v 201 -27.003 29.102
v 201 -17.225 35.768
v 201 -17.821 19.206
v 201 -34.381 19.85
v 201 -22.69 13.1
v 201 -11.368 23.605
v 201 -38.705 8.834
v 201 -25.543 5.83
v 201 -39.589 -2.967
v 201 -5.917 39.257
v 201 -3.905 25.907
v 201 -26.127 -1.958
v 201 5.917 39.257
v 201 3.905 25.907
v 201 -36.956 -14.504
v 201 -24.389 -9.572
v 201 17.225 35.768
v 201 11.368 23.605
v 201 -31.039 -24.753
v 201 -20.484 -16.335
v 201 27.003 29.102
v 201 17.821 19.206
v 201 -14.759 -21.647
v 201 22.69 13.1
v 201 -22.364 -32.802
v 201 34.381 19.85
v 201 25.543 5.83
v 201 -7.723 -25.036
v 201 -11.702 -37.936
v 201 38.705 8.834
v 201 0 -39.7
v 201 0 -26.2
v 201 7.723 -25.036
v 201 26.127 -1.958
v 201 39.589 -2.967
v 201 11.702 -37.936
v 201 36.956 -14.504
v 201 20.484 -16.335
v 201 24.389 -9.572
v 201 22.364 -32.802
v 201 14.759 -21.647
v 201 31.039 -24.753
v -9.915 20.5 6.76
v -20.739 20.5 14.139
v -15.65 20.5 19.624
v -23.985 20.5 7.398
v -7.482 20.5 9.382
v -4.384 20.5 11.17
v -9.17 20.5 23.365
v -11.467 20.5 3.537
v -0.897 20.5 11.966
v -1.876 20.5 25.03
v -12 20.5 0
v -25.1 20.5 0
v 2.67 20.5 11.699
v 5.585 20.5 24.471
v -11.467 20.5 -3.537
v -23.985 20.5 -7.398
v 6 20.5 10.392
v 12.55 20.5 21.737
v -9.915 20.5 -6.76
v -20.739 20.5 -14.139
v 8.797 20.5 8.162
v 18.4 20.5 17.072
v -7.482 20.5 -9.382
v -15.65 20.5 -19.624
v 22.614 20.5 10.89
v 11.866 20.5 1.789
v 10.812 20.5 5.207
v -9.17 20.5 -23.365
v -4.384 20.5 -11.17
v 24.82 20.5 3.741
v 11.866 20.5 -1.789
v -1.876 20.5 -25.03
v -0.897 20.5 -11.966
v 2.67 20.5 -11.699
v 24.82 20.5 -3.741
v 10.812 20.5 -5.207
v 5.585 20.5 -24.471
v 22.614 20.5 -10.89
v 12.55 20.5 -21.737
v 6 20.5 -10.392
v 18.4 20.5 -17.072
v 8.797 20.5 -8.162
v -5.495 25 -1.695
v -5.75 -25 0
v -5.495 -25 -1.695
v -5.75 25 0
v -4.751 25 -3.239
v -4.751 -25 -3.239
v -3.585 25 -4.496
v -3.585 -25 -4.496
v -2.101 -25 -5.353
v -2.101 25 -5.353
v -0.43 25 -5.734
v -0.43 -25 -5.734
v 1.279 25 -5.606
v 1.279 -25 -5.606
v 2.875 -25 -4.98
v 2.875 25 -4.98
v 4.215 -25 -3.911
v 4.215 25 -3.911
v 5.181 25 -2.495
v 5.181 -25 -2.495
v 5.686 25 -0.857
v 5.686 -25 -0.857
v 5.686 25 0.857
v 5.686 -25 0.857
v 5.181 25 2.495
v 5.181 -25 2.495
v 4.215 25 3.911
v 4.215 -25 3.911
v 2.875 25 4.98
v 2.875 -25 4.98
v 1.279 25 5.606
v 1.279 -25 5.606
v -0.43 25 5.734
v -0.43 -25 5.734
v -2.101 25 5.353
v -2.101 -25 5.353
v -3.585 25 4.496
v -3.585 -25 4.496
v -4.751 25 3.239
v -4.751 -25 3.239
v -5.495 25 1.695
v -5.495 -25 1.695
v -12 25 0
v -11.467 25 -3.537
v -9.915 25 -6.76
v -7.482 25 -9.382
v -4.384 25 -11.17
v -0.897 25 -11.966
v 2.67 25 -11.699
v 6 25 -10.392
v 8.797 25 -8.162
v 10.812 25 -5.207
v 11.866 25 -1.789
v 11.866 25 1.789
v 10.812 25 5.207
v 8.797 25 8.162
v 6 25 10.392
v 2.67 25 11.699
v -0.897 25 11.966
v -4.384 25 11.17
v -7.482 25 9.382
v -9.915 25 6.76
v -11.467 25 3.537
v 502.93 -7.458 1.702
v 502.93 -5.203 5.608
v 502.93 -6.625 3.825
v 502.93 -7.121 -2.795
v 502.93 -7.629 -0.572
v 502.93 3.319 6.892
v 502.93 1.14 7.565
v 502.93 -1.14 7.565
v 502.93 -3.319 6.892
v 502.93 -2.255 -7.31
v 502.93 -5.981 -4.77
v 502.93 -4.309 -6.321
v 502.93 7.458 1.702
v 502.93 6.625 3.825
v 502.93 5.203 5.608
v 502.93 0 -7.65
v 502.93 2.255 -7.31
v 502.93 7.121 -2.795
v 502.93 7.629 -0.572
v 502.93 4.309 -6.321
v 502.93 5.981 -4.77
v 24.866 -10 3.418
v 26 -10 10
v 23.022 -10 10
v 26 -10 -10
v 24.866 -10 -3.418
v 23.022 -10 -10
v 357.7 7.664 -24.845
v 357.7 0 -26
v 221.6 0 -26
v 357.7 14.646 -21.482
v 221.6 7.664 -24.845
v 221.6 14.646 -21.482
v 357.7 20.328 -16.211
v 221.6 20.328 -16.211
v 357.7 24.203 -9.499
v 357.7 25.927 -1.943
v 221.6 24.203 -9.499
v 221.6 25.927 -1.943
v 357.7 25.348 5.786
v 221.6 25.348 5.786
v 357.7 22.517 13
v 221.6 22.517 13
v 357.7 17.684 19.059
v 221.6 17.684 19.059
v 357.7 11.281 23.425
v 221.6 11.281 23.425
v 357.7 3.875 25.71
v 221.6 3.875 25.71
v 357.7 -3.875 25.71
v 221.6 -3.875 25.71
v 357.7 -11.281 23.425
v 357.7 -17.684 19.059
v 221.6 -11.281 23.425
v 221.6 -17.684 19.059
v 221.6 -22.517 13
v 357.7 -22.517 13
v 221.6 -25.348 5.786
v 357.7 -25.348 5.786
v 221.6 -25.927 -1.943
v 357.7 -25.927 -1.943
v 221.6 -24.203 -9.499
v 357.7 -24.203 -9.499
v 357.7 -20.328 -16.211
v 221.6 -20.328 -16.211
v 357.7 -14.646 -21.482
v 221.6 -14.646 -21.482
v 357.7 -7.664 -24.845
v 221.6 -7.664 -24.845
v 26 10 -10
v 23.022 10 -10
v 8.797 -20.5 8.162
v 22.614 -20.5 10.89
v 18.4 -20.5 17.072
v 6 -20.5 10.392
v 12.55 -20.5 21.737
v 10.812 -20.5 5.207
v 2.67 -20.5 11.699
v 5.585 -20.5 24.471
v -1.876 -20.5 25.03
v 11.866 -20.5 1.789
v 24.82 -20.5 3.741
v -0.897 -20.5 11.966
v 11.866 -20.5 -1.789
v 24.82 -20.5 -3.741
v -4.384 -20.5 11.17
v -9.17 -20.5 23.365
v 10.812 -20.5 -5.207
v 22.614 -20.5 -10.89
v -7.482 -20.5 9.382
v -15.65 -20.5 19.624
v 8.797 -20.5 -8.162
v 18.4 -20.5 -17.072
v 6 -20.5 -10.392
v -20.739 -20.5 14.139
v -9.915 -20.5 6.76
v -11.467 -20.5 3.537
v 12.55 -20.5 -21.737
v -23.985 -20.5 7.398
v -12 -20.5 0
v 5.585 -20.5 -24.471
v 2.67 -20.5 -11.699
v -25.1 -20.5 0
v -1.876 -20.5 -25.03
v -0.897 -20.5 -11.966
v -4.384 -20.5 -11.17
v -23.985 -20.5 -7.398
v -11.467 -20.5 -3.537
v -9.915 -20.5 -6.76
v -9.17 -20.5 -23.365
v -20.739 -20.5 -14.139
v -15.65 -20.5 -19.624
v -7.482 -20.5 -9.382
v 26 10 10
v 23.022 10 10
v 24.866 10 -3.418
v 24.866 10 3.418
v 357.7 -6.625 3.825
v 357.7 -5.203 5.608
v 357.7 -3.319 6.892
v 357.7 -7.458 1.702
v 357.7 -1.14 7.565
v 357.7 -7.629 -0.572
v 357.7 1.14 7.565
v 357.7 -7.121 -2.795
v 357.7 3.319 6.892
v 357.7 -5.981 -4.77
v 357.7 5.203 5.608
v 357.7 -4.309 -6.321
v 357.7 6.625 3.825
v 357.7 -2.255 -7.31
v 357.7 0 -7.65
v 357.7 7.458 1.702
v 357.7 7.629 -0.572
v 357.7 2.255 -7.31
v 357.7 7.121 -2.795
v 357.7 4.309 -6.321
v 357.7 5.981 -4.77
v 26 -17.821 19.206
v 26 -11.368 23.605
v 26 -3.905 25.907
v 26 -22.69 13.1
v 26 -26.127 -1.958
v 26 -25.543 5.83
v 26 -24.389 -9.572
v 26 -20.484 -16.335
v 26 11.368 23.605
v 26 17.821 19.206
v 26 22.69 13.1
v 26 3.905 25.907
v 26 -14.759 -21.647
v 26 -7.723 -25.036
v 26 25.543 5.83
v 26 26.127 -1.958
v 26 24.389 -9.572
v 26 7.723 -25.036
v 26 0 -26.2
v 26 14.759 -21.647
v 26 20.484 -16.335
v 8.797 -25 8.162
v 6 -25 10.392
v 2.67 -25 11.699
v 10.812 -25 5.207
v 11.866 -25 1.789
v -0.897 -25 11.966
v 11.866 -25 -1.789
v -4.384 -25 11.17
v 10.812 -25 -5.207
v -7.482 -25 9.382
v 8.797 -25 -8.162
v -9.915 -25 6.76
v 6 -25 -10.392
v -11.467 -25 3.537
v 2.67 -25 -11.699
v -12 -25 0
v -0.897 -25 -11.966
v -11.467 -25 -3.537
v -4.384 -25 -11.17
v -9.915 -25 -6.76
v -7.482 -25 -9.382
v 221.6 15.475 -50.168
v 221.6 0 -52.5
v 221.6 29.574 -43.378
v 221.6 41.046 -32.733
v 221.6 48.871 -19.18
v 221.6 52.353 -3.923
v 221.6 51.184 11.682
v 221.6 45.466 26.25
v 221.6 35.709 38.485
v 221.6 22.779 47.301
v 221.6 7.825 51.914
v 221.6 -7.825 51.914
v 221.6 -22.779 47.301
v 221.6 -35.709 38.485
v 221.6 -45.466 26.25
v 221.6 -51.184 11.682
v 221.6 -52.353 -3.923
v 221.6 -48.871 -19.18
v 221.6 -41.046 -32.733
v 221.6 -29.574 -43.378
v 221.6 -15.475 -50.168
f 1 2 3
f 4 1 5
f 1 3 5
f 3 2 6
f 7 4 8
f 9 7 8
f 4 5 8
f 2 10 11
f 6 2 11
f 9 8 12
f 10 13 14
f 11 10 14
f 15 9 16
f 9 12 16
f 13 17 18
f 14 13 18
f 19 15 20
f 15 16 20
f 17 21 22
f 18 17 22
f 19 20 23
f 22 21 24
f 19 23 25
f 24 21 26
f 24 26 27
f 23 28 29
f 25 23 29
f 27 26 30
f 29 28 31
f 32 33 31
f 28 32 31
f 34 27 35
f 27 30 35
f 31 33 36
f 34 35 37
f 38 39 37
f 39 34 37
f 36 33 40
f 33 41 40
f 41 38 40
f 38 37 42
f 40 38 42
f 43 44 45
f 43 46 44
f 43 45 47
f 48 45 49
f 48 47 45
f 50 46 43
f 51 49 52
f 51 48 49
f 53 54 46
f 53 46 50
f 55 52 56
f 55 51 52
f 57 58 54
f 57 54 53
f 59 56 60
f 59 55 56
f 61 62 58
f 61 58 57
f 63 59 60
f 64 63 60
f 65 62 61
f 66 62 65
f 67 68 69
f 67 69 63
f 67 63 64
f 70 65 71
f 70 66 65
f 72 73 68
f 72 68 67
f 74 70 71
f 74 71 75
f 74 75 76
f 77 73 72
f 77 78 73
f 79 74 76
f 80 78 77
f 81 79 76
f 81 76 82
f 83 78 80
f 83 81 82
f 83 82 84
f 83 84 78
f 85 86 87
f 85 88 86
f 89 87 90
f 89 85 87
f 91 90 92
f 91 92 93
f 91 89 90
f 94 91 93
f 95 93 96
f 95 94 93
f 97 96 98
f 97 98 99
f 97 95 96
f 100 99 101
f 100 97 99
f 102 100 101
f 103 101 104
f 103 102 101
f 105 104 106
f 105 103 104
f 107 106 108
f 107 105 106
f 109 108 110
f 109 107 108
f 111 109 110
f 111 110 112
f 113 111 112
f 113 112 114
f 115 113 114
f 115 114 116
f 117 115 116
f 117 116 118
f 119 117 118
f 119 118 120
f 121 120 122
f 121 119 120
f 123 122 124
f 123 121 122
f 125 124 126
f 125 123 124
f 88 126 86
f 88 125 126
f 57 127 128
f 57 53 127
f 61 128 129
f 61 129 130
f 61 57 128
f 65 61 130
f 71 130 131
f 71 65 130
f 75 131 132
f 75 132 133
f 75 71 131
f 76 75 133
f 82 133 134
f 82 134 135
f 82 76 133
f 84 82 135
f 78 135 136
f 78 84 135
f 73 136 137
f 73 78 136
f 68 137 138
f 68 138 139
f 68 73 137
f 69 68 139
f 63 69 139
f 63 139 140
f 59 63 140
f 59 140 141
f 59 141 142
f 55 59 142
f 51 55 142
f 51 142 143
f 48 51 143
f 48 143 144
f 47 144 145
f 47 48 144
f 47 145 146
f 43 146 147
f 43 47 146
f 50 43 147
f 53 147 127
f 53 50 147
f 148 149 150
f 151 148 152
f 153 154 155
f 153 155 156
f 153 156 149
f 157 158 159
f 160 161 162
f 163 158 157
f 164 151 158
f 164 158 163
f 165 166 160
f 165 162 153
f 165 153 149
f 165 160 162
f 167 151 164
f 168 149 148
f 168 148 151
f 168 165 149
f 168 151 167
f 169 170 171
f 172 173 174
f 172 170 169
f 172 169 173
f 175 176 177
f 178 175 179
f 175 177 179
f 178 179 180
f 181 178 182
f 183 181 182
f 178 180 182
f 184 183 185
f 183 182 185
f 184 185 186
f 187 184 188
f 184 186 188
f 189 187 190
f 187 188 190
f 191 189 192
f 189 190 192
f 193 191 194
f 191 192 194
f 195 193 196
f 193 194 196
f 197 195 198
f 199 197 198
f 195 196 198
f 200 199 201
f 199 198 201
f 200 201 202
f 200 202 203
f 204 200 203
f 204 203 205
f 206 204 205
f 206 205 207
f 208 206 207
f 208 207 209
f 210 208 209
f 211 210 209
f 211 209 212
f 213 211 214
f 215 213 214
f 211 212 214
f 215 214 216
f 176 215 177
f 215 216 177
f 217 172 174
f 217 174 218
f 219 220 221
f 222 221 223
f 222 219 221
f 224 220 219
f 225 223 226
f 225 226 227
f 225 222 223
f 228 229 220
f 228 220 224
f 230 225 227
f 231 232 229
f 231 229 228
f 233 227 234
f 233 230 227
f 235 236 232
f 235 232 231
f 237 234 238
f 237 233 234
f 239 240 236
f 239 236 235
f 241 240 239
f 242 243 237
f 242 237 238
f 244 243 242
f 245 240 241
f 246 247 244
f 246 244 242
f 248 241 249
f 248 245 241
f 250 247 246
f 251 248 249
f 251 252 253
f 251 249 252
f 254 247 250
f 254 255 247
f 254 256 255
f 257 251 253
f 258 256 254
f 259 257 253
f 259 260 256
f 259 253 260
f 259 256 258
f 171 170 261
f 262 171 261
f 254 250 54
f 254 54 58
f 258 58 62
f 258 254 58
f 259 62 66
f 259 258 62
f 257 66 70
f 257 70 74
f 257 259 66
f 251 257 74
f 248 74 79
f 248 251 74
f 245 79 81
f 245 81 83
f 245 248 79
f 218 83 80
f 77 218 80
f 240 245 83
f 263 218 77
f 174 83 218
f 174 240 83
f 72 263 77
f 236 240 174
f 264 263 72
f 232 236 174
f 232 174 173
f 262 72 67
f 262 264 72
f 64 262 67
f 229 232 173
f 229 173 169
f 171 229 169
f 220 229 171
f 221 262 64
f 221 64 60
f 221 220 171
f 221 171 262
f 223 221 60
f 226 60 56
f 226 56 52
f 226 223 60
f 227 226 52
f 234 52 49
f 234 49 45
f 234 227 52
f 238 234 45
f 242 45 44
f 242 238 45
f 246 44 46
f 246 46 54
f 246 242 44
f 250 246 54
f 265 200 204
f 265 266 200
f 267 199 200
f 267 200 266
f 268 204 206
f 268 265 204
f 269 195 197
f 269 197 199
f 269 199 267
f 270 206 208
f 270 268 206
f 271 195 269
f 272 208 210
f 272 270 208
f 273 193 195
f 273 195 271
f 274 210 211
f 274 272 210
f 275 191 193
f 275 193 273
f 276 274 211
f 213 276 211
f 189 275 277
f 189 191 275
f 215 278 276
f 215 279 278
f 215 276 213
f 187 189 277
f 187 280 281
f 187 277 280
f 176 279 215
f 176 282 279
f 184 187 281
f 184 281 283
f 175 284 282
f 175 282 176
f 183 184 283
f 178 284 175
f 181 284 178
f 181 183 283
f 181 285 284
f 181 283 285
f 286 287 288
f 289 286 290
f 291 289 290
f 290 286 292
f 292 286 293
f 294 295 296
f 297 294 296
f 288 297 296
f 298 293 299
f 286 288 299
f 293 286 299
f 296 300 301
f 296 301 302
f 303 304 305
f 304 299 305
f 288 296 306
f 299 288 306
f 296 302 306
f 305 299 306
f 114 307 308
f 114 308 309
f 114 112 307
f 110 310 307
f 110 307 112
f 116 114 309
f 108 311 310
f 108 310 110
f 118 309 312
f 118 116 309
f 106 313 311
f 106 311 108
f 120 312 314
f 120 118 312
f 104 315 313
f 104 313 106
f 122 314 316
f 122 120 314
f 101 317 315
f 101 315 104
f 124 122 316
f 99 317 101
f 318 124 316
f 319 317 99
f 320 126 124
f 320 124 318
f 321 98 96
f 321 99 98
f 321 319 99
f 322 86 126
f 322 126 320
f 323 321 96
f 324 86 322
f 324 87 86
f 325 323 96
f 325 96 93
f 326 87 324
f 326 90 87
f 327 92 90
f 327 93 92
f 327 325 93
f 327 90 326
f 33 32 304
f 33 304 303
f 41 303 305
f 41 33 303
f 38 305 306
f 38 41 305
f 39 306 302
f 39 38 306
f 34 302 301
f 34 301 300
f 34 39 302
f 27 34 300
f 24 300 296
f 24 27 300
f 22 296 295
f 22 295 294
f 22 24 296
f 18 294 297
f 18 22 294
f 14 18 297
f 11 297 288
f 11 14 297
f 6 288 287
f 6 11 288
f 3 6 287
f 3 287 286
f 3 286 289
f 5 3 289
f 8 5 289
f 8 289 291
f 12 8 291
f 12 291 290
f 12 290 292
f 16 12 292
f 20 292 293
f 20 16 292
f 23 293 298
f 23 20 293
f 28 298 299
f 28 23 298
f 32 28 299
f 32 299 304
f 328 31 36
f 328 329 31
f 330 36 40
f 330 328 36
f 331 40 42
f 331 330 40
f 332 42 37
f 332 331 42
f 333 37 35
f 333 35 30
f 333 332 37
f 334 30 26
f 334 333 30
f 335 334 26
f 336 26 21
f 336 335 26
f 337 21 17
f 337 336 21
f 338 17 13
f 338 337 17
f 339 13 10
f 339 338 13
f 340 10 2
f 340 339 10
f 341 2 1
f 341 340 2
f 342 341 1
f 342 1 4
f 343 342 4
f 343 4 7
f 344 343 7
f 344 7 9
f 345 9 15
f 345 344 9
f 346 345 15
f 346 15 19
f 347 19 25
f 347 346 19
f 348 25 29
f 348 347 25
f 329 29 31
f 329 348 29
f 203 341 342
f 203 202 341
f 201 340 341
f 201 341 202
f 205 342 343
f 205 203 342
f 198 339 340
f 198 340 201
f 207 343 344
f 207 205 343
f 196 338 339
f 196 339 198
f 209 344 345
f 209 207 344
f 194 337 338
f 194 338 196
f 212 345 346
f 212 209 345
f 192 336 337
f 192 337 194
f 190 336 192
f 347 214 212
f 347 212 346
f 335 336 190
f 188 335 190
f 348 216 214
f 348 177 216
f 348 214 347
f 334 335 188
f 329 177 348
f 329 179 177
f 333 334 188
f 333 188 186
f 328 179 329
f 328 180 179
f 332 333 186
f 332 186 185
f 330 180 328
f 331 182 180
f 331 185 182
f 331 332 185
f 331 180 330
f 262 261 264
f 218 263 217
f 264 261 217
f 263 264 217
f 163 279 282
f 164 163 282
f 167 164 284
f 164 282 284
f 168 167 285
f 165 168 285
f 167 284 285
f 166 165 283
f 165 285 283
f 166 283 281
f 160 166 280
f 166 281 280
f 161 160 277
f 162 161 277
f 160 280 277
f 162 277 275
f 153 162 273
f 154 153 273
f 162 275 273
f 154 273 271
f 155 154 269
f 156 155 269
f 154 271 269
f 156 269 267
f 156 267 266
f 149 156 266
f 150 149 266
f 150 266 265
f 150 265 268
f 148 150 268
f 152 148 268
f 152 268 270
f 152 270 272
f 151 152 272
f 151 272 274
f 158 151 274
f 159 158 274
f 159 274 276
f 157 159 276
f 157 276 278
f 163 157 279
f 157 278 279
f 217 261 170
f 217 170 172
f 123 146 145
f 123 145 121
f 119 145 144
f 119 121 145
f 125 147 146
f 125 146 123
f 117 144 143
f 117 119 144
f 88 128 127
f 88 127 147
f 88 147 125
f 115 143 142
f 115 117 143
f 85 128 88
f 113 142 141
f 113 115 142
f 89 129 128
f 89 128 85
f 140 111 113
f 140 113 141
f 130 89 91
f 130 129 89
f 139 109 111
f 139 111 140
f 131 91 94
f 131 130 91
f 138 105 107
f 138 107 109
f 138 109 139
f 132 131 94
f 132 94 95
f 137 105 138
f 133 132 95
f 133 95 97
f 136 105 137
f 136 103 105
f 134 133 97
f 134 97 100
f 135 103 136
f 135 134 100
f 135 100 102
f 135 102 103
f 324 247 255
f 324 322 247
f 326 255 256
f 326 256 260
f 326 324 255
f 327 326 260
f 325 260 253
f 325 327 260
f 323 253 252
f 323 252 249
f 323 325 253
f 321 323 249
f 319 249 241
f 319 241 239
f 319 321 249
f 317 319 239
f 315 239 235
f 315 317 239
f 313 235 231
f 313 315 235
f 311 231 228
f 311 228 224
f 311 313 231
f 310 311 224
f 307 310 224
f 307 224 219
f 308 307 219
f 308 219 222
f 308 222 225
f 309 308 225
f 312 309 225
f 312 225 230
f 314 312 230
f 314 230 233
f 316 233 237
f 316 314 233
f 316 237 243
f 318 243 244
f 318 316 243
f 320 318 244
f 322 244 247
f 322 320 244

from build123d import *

# Parameters (mm, degrees)
SKETCH_2_R      = 26.2
EXTRUDE_1_DEPTH = 175
SKETCH_3_W      = 20
SKETCH_3_H      = 20
EXTRUDE_2_DEPTH = 3
SKETCH_4_R      = 39.7
SKETCH_5_R      = 52.5
SKETCH_6_R      = 26
EXTRUDE_3_DEPTH = 136.1
SKETCH_7_R      = 7.65
EXTRUDE_4_DEPTH = 145.23


with BuildPart() as part:
    # 草图1 → 旋转1 (revolve)
    with BuildSketch(Plane.XY):
        Polygon((-5.75, 25), (-12, 25), (-12, 20.5), (-25.1, 20.5), (-25.1, -20.5), (-12, -20.5), (-12, -25), (-5.75, -25), align=None)
    revolve(axis=Axis((0, 58.939420169, 0), (0, -1, 0)))

    # 草图3 → 凸台-拉伸2 (add)
    with BuildSketch(Plane(origin=(26, 0, 0), x_dir=(0, 0, -1), z_dir=(1, 0, 0))):
        Rectangle(SKETCH_3_W, SKETCH_3_H)
    extrude(amount=-EXTRUDE_2_DEPTH)


with BuildPart() as body_2:
    # 草图2 → 凸台-拉伸1 (new body)
    with BuildSketch(Plane(origin=(201, 0, 0), x_dir=(0, 0, -1), z_dir=(1, 0, 0))):
        Circle(SKETCH_2_R)
    extrude(amount=-EXTRUDE_1_DEPTH)

    # 草图4 → 放样2 section 0
    with BuildSketch(Plane(origin=(201, 0, 0), x_dir=(0, 0, -1), z_dir=(1, 0, 0))):
        Circle(SKETCH_4_R)
    # 草图5 → 放样2 section 1
    with BuildSketch(Plane(origin=(221.6, 0, 0), x_dir=(0, 0, -1), z_dir=(1, 0, 0))):
        Circle(SKETCH_5_R)
    loft()

    # 草图6 → 凸台-拉伸3 (add)
    with BuildSketch(Plane(origin=(221.6, 0, 0), x_dir=(0, 0, -1), z_dir=(1, 0, 0))):
        Circle(SKETCH_6_R)
    extrude(amount=EXTRUDE_3_DEPTH)

    # 草图7 → 凸台-拉伸4 (add)
    with BuildSketch(Plane(origin=(357.7, 0, 0), x_dir=(0, 0, -1), z_dir=(1, 0, 0))):
        Circle(SKETCH_7_R)
    extrude(amount=EXTRUDE_4_DEPTH)


solid = Compound([part.part, body_2.part])
